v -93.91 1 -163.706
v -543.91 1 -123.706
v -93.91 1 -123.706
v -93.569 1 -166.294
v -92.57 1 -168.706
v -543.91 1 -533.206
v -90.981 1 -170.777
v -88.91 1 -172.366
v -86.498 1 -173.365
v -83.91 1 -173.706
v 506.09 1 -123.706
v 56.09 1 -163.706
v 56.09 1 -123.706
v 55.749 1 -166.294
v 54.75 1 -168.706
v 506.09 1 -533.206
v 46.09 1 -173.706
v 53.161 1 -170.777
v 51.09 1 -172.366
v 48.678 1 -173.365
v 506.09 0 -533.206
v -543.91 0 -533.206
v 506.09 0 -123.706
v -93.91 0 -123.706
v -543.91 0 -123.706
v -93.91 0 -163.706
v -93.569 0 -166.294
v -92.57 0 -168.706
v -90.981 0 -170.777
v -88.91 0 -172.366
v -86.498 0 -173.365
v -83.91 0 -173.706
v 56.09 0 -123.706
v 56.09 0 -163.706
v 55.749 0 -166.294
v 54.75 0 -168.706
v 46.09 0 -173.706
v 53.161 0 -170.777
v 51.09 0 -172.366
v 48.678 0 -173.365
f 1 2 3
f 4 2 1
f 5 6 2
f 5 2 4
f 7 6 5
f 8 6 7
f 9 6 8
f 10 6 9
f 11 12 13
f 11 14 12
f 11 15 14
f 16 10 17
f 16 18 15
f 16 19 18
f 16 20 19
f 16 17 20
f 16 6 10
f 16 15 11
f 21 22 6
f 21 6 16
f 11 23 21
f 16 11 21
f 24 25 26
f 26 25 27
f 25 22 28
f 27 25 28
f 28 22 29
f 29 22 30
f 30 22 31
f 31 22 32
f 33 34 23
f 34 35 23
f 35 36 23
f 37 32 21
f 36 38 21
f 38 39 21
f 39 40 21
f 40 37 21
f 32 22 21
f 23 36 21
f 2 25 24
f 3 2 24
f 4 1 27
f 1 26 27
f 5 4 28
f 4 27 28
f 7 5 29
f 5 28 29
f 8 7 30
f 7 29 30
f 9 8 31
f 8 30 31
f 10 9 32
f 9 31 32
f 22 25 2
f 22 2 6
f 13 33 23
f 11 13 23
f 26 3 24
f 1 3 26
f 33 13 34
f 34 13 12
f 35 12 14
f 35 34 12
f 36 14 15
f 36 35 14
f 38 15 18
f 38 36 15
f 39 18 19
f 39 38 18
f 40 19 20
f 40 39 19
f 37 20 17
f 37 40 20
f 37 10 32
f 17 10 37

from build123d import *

# Parameters (mm, degrees)
SKETCH1_W           = 1050
SKETCH1_H           = 409.5
BOSS_EXTRUDE1_DEPTH = 1
SKETCH2_W           = 150
SKETCH2_H           = 50
CUT_EXTRUDE1_DEPTH  = 1
FILLET1_R           = 10


with BuildPart() as part:
    # Sketch1 → Boss-Extrude1 (new body)
    with BuildSketch(Plane(origin=(0, 0, 0), x_dir=(1, 0, 0), z_dir=(0, 1, 0))):
        with Locations((-18.909884175, 328.455718826)):
            Rectangle(SKETCH1_W, SKETCH1_H)
    extrude(amount=BOSS_EXTRUDE1_DEPTH)

    # Sketch2 → Cut-Extrude1 (cut)
    with BuildSketch(Plane(origin=(0, 1, 0), x_dir=(1, 0, 0), z_dir=(0, 1, 0))):
        with Locations((-18.909884175, 148.705718826)):
            Rectangle(SKETCH2_W, SKETCH2_H)
    extrude(amount=-CUT_EXTRUDE1_DEPTH, mode=Mode.SUBTRACT)

    # Fillet1
    fillet1_edges = [part.edges().sort_by_distance(p)[0] for p in [
        (-93.909884175, 0.5, -173.705718826),
        (56.090115825, 0.5, -173.705718826),
    ]]
    fillet(fillet1_edges, radius=FILLET1_R)


solid = part.part
